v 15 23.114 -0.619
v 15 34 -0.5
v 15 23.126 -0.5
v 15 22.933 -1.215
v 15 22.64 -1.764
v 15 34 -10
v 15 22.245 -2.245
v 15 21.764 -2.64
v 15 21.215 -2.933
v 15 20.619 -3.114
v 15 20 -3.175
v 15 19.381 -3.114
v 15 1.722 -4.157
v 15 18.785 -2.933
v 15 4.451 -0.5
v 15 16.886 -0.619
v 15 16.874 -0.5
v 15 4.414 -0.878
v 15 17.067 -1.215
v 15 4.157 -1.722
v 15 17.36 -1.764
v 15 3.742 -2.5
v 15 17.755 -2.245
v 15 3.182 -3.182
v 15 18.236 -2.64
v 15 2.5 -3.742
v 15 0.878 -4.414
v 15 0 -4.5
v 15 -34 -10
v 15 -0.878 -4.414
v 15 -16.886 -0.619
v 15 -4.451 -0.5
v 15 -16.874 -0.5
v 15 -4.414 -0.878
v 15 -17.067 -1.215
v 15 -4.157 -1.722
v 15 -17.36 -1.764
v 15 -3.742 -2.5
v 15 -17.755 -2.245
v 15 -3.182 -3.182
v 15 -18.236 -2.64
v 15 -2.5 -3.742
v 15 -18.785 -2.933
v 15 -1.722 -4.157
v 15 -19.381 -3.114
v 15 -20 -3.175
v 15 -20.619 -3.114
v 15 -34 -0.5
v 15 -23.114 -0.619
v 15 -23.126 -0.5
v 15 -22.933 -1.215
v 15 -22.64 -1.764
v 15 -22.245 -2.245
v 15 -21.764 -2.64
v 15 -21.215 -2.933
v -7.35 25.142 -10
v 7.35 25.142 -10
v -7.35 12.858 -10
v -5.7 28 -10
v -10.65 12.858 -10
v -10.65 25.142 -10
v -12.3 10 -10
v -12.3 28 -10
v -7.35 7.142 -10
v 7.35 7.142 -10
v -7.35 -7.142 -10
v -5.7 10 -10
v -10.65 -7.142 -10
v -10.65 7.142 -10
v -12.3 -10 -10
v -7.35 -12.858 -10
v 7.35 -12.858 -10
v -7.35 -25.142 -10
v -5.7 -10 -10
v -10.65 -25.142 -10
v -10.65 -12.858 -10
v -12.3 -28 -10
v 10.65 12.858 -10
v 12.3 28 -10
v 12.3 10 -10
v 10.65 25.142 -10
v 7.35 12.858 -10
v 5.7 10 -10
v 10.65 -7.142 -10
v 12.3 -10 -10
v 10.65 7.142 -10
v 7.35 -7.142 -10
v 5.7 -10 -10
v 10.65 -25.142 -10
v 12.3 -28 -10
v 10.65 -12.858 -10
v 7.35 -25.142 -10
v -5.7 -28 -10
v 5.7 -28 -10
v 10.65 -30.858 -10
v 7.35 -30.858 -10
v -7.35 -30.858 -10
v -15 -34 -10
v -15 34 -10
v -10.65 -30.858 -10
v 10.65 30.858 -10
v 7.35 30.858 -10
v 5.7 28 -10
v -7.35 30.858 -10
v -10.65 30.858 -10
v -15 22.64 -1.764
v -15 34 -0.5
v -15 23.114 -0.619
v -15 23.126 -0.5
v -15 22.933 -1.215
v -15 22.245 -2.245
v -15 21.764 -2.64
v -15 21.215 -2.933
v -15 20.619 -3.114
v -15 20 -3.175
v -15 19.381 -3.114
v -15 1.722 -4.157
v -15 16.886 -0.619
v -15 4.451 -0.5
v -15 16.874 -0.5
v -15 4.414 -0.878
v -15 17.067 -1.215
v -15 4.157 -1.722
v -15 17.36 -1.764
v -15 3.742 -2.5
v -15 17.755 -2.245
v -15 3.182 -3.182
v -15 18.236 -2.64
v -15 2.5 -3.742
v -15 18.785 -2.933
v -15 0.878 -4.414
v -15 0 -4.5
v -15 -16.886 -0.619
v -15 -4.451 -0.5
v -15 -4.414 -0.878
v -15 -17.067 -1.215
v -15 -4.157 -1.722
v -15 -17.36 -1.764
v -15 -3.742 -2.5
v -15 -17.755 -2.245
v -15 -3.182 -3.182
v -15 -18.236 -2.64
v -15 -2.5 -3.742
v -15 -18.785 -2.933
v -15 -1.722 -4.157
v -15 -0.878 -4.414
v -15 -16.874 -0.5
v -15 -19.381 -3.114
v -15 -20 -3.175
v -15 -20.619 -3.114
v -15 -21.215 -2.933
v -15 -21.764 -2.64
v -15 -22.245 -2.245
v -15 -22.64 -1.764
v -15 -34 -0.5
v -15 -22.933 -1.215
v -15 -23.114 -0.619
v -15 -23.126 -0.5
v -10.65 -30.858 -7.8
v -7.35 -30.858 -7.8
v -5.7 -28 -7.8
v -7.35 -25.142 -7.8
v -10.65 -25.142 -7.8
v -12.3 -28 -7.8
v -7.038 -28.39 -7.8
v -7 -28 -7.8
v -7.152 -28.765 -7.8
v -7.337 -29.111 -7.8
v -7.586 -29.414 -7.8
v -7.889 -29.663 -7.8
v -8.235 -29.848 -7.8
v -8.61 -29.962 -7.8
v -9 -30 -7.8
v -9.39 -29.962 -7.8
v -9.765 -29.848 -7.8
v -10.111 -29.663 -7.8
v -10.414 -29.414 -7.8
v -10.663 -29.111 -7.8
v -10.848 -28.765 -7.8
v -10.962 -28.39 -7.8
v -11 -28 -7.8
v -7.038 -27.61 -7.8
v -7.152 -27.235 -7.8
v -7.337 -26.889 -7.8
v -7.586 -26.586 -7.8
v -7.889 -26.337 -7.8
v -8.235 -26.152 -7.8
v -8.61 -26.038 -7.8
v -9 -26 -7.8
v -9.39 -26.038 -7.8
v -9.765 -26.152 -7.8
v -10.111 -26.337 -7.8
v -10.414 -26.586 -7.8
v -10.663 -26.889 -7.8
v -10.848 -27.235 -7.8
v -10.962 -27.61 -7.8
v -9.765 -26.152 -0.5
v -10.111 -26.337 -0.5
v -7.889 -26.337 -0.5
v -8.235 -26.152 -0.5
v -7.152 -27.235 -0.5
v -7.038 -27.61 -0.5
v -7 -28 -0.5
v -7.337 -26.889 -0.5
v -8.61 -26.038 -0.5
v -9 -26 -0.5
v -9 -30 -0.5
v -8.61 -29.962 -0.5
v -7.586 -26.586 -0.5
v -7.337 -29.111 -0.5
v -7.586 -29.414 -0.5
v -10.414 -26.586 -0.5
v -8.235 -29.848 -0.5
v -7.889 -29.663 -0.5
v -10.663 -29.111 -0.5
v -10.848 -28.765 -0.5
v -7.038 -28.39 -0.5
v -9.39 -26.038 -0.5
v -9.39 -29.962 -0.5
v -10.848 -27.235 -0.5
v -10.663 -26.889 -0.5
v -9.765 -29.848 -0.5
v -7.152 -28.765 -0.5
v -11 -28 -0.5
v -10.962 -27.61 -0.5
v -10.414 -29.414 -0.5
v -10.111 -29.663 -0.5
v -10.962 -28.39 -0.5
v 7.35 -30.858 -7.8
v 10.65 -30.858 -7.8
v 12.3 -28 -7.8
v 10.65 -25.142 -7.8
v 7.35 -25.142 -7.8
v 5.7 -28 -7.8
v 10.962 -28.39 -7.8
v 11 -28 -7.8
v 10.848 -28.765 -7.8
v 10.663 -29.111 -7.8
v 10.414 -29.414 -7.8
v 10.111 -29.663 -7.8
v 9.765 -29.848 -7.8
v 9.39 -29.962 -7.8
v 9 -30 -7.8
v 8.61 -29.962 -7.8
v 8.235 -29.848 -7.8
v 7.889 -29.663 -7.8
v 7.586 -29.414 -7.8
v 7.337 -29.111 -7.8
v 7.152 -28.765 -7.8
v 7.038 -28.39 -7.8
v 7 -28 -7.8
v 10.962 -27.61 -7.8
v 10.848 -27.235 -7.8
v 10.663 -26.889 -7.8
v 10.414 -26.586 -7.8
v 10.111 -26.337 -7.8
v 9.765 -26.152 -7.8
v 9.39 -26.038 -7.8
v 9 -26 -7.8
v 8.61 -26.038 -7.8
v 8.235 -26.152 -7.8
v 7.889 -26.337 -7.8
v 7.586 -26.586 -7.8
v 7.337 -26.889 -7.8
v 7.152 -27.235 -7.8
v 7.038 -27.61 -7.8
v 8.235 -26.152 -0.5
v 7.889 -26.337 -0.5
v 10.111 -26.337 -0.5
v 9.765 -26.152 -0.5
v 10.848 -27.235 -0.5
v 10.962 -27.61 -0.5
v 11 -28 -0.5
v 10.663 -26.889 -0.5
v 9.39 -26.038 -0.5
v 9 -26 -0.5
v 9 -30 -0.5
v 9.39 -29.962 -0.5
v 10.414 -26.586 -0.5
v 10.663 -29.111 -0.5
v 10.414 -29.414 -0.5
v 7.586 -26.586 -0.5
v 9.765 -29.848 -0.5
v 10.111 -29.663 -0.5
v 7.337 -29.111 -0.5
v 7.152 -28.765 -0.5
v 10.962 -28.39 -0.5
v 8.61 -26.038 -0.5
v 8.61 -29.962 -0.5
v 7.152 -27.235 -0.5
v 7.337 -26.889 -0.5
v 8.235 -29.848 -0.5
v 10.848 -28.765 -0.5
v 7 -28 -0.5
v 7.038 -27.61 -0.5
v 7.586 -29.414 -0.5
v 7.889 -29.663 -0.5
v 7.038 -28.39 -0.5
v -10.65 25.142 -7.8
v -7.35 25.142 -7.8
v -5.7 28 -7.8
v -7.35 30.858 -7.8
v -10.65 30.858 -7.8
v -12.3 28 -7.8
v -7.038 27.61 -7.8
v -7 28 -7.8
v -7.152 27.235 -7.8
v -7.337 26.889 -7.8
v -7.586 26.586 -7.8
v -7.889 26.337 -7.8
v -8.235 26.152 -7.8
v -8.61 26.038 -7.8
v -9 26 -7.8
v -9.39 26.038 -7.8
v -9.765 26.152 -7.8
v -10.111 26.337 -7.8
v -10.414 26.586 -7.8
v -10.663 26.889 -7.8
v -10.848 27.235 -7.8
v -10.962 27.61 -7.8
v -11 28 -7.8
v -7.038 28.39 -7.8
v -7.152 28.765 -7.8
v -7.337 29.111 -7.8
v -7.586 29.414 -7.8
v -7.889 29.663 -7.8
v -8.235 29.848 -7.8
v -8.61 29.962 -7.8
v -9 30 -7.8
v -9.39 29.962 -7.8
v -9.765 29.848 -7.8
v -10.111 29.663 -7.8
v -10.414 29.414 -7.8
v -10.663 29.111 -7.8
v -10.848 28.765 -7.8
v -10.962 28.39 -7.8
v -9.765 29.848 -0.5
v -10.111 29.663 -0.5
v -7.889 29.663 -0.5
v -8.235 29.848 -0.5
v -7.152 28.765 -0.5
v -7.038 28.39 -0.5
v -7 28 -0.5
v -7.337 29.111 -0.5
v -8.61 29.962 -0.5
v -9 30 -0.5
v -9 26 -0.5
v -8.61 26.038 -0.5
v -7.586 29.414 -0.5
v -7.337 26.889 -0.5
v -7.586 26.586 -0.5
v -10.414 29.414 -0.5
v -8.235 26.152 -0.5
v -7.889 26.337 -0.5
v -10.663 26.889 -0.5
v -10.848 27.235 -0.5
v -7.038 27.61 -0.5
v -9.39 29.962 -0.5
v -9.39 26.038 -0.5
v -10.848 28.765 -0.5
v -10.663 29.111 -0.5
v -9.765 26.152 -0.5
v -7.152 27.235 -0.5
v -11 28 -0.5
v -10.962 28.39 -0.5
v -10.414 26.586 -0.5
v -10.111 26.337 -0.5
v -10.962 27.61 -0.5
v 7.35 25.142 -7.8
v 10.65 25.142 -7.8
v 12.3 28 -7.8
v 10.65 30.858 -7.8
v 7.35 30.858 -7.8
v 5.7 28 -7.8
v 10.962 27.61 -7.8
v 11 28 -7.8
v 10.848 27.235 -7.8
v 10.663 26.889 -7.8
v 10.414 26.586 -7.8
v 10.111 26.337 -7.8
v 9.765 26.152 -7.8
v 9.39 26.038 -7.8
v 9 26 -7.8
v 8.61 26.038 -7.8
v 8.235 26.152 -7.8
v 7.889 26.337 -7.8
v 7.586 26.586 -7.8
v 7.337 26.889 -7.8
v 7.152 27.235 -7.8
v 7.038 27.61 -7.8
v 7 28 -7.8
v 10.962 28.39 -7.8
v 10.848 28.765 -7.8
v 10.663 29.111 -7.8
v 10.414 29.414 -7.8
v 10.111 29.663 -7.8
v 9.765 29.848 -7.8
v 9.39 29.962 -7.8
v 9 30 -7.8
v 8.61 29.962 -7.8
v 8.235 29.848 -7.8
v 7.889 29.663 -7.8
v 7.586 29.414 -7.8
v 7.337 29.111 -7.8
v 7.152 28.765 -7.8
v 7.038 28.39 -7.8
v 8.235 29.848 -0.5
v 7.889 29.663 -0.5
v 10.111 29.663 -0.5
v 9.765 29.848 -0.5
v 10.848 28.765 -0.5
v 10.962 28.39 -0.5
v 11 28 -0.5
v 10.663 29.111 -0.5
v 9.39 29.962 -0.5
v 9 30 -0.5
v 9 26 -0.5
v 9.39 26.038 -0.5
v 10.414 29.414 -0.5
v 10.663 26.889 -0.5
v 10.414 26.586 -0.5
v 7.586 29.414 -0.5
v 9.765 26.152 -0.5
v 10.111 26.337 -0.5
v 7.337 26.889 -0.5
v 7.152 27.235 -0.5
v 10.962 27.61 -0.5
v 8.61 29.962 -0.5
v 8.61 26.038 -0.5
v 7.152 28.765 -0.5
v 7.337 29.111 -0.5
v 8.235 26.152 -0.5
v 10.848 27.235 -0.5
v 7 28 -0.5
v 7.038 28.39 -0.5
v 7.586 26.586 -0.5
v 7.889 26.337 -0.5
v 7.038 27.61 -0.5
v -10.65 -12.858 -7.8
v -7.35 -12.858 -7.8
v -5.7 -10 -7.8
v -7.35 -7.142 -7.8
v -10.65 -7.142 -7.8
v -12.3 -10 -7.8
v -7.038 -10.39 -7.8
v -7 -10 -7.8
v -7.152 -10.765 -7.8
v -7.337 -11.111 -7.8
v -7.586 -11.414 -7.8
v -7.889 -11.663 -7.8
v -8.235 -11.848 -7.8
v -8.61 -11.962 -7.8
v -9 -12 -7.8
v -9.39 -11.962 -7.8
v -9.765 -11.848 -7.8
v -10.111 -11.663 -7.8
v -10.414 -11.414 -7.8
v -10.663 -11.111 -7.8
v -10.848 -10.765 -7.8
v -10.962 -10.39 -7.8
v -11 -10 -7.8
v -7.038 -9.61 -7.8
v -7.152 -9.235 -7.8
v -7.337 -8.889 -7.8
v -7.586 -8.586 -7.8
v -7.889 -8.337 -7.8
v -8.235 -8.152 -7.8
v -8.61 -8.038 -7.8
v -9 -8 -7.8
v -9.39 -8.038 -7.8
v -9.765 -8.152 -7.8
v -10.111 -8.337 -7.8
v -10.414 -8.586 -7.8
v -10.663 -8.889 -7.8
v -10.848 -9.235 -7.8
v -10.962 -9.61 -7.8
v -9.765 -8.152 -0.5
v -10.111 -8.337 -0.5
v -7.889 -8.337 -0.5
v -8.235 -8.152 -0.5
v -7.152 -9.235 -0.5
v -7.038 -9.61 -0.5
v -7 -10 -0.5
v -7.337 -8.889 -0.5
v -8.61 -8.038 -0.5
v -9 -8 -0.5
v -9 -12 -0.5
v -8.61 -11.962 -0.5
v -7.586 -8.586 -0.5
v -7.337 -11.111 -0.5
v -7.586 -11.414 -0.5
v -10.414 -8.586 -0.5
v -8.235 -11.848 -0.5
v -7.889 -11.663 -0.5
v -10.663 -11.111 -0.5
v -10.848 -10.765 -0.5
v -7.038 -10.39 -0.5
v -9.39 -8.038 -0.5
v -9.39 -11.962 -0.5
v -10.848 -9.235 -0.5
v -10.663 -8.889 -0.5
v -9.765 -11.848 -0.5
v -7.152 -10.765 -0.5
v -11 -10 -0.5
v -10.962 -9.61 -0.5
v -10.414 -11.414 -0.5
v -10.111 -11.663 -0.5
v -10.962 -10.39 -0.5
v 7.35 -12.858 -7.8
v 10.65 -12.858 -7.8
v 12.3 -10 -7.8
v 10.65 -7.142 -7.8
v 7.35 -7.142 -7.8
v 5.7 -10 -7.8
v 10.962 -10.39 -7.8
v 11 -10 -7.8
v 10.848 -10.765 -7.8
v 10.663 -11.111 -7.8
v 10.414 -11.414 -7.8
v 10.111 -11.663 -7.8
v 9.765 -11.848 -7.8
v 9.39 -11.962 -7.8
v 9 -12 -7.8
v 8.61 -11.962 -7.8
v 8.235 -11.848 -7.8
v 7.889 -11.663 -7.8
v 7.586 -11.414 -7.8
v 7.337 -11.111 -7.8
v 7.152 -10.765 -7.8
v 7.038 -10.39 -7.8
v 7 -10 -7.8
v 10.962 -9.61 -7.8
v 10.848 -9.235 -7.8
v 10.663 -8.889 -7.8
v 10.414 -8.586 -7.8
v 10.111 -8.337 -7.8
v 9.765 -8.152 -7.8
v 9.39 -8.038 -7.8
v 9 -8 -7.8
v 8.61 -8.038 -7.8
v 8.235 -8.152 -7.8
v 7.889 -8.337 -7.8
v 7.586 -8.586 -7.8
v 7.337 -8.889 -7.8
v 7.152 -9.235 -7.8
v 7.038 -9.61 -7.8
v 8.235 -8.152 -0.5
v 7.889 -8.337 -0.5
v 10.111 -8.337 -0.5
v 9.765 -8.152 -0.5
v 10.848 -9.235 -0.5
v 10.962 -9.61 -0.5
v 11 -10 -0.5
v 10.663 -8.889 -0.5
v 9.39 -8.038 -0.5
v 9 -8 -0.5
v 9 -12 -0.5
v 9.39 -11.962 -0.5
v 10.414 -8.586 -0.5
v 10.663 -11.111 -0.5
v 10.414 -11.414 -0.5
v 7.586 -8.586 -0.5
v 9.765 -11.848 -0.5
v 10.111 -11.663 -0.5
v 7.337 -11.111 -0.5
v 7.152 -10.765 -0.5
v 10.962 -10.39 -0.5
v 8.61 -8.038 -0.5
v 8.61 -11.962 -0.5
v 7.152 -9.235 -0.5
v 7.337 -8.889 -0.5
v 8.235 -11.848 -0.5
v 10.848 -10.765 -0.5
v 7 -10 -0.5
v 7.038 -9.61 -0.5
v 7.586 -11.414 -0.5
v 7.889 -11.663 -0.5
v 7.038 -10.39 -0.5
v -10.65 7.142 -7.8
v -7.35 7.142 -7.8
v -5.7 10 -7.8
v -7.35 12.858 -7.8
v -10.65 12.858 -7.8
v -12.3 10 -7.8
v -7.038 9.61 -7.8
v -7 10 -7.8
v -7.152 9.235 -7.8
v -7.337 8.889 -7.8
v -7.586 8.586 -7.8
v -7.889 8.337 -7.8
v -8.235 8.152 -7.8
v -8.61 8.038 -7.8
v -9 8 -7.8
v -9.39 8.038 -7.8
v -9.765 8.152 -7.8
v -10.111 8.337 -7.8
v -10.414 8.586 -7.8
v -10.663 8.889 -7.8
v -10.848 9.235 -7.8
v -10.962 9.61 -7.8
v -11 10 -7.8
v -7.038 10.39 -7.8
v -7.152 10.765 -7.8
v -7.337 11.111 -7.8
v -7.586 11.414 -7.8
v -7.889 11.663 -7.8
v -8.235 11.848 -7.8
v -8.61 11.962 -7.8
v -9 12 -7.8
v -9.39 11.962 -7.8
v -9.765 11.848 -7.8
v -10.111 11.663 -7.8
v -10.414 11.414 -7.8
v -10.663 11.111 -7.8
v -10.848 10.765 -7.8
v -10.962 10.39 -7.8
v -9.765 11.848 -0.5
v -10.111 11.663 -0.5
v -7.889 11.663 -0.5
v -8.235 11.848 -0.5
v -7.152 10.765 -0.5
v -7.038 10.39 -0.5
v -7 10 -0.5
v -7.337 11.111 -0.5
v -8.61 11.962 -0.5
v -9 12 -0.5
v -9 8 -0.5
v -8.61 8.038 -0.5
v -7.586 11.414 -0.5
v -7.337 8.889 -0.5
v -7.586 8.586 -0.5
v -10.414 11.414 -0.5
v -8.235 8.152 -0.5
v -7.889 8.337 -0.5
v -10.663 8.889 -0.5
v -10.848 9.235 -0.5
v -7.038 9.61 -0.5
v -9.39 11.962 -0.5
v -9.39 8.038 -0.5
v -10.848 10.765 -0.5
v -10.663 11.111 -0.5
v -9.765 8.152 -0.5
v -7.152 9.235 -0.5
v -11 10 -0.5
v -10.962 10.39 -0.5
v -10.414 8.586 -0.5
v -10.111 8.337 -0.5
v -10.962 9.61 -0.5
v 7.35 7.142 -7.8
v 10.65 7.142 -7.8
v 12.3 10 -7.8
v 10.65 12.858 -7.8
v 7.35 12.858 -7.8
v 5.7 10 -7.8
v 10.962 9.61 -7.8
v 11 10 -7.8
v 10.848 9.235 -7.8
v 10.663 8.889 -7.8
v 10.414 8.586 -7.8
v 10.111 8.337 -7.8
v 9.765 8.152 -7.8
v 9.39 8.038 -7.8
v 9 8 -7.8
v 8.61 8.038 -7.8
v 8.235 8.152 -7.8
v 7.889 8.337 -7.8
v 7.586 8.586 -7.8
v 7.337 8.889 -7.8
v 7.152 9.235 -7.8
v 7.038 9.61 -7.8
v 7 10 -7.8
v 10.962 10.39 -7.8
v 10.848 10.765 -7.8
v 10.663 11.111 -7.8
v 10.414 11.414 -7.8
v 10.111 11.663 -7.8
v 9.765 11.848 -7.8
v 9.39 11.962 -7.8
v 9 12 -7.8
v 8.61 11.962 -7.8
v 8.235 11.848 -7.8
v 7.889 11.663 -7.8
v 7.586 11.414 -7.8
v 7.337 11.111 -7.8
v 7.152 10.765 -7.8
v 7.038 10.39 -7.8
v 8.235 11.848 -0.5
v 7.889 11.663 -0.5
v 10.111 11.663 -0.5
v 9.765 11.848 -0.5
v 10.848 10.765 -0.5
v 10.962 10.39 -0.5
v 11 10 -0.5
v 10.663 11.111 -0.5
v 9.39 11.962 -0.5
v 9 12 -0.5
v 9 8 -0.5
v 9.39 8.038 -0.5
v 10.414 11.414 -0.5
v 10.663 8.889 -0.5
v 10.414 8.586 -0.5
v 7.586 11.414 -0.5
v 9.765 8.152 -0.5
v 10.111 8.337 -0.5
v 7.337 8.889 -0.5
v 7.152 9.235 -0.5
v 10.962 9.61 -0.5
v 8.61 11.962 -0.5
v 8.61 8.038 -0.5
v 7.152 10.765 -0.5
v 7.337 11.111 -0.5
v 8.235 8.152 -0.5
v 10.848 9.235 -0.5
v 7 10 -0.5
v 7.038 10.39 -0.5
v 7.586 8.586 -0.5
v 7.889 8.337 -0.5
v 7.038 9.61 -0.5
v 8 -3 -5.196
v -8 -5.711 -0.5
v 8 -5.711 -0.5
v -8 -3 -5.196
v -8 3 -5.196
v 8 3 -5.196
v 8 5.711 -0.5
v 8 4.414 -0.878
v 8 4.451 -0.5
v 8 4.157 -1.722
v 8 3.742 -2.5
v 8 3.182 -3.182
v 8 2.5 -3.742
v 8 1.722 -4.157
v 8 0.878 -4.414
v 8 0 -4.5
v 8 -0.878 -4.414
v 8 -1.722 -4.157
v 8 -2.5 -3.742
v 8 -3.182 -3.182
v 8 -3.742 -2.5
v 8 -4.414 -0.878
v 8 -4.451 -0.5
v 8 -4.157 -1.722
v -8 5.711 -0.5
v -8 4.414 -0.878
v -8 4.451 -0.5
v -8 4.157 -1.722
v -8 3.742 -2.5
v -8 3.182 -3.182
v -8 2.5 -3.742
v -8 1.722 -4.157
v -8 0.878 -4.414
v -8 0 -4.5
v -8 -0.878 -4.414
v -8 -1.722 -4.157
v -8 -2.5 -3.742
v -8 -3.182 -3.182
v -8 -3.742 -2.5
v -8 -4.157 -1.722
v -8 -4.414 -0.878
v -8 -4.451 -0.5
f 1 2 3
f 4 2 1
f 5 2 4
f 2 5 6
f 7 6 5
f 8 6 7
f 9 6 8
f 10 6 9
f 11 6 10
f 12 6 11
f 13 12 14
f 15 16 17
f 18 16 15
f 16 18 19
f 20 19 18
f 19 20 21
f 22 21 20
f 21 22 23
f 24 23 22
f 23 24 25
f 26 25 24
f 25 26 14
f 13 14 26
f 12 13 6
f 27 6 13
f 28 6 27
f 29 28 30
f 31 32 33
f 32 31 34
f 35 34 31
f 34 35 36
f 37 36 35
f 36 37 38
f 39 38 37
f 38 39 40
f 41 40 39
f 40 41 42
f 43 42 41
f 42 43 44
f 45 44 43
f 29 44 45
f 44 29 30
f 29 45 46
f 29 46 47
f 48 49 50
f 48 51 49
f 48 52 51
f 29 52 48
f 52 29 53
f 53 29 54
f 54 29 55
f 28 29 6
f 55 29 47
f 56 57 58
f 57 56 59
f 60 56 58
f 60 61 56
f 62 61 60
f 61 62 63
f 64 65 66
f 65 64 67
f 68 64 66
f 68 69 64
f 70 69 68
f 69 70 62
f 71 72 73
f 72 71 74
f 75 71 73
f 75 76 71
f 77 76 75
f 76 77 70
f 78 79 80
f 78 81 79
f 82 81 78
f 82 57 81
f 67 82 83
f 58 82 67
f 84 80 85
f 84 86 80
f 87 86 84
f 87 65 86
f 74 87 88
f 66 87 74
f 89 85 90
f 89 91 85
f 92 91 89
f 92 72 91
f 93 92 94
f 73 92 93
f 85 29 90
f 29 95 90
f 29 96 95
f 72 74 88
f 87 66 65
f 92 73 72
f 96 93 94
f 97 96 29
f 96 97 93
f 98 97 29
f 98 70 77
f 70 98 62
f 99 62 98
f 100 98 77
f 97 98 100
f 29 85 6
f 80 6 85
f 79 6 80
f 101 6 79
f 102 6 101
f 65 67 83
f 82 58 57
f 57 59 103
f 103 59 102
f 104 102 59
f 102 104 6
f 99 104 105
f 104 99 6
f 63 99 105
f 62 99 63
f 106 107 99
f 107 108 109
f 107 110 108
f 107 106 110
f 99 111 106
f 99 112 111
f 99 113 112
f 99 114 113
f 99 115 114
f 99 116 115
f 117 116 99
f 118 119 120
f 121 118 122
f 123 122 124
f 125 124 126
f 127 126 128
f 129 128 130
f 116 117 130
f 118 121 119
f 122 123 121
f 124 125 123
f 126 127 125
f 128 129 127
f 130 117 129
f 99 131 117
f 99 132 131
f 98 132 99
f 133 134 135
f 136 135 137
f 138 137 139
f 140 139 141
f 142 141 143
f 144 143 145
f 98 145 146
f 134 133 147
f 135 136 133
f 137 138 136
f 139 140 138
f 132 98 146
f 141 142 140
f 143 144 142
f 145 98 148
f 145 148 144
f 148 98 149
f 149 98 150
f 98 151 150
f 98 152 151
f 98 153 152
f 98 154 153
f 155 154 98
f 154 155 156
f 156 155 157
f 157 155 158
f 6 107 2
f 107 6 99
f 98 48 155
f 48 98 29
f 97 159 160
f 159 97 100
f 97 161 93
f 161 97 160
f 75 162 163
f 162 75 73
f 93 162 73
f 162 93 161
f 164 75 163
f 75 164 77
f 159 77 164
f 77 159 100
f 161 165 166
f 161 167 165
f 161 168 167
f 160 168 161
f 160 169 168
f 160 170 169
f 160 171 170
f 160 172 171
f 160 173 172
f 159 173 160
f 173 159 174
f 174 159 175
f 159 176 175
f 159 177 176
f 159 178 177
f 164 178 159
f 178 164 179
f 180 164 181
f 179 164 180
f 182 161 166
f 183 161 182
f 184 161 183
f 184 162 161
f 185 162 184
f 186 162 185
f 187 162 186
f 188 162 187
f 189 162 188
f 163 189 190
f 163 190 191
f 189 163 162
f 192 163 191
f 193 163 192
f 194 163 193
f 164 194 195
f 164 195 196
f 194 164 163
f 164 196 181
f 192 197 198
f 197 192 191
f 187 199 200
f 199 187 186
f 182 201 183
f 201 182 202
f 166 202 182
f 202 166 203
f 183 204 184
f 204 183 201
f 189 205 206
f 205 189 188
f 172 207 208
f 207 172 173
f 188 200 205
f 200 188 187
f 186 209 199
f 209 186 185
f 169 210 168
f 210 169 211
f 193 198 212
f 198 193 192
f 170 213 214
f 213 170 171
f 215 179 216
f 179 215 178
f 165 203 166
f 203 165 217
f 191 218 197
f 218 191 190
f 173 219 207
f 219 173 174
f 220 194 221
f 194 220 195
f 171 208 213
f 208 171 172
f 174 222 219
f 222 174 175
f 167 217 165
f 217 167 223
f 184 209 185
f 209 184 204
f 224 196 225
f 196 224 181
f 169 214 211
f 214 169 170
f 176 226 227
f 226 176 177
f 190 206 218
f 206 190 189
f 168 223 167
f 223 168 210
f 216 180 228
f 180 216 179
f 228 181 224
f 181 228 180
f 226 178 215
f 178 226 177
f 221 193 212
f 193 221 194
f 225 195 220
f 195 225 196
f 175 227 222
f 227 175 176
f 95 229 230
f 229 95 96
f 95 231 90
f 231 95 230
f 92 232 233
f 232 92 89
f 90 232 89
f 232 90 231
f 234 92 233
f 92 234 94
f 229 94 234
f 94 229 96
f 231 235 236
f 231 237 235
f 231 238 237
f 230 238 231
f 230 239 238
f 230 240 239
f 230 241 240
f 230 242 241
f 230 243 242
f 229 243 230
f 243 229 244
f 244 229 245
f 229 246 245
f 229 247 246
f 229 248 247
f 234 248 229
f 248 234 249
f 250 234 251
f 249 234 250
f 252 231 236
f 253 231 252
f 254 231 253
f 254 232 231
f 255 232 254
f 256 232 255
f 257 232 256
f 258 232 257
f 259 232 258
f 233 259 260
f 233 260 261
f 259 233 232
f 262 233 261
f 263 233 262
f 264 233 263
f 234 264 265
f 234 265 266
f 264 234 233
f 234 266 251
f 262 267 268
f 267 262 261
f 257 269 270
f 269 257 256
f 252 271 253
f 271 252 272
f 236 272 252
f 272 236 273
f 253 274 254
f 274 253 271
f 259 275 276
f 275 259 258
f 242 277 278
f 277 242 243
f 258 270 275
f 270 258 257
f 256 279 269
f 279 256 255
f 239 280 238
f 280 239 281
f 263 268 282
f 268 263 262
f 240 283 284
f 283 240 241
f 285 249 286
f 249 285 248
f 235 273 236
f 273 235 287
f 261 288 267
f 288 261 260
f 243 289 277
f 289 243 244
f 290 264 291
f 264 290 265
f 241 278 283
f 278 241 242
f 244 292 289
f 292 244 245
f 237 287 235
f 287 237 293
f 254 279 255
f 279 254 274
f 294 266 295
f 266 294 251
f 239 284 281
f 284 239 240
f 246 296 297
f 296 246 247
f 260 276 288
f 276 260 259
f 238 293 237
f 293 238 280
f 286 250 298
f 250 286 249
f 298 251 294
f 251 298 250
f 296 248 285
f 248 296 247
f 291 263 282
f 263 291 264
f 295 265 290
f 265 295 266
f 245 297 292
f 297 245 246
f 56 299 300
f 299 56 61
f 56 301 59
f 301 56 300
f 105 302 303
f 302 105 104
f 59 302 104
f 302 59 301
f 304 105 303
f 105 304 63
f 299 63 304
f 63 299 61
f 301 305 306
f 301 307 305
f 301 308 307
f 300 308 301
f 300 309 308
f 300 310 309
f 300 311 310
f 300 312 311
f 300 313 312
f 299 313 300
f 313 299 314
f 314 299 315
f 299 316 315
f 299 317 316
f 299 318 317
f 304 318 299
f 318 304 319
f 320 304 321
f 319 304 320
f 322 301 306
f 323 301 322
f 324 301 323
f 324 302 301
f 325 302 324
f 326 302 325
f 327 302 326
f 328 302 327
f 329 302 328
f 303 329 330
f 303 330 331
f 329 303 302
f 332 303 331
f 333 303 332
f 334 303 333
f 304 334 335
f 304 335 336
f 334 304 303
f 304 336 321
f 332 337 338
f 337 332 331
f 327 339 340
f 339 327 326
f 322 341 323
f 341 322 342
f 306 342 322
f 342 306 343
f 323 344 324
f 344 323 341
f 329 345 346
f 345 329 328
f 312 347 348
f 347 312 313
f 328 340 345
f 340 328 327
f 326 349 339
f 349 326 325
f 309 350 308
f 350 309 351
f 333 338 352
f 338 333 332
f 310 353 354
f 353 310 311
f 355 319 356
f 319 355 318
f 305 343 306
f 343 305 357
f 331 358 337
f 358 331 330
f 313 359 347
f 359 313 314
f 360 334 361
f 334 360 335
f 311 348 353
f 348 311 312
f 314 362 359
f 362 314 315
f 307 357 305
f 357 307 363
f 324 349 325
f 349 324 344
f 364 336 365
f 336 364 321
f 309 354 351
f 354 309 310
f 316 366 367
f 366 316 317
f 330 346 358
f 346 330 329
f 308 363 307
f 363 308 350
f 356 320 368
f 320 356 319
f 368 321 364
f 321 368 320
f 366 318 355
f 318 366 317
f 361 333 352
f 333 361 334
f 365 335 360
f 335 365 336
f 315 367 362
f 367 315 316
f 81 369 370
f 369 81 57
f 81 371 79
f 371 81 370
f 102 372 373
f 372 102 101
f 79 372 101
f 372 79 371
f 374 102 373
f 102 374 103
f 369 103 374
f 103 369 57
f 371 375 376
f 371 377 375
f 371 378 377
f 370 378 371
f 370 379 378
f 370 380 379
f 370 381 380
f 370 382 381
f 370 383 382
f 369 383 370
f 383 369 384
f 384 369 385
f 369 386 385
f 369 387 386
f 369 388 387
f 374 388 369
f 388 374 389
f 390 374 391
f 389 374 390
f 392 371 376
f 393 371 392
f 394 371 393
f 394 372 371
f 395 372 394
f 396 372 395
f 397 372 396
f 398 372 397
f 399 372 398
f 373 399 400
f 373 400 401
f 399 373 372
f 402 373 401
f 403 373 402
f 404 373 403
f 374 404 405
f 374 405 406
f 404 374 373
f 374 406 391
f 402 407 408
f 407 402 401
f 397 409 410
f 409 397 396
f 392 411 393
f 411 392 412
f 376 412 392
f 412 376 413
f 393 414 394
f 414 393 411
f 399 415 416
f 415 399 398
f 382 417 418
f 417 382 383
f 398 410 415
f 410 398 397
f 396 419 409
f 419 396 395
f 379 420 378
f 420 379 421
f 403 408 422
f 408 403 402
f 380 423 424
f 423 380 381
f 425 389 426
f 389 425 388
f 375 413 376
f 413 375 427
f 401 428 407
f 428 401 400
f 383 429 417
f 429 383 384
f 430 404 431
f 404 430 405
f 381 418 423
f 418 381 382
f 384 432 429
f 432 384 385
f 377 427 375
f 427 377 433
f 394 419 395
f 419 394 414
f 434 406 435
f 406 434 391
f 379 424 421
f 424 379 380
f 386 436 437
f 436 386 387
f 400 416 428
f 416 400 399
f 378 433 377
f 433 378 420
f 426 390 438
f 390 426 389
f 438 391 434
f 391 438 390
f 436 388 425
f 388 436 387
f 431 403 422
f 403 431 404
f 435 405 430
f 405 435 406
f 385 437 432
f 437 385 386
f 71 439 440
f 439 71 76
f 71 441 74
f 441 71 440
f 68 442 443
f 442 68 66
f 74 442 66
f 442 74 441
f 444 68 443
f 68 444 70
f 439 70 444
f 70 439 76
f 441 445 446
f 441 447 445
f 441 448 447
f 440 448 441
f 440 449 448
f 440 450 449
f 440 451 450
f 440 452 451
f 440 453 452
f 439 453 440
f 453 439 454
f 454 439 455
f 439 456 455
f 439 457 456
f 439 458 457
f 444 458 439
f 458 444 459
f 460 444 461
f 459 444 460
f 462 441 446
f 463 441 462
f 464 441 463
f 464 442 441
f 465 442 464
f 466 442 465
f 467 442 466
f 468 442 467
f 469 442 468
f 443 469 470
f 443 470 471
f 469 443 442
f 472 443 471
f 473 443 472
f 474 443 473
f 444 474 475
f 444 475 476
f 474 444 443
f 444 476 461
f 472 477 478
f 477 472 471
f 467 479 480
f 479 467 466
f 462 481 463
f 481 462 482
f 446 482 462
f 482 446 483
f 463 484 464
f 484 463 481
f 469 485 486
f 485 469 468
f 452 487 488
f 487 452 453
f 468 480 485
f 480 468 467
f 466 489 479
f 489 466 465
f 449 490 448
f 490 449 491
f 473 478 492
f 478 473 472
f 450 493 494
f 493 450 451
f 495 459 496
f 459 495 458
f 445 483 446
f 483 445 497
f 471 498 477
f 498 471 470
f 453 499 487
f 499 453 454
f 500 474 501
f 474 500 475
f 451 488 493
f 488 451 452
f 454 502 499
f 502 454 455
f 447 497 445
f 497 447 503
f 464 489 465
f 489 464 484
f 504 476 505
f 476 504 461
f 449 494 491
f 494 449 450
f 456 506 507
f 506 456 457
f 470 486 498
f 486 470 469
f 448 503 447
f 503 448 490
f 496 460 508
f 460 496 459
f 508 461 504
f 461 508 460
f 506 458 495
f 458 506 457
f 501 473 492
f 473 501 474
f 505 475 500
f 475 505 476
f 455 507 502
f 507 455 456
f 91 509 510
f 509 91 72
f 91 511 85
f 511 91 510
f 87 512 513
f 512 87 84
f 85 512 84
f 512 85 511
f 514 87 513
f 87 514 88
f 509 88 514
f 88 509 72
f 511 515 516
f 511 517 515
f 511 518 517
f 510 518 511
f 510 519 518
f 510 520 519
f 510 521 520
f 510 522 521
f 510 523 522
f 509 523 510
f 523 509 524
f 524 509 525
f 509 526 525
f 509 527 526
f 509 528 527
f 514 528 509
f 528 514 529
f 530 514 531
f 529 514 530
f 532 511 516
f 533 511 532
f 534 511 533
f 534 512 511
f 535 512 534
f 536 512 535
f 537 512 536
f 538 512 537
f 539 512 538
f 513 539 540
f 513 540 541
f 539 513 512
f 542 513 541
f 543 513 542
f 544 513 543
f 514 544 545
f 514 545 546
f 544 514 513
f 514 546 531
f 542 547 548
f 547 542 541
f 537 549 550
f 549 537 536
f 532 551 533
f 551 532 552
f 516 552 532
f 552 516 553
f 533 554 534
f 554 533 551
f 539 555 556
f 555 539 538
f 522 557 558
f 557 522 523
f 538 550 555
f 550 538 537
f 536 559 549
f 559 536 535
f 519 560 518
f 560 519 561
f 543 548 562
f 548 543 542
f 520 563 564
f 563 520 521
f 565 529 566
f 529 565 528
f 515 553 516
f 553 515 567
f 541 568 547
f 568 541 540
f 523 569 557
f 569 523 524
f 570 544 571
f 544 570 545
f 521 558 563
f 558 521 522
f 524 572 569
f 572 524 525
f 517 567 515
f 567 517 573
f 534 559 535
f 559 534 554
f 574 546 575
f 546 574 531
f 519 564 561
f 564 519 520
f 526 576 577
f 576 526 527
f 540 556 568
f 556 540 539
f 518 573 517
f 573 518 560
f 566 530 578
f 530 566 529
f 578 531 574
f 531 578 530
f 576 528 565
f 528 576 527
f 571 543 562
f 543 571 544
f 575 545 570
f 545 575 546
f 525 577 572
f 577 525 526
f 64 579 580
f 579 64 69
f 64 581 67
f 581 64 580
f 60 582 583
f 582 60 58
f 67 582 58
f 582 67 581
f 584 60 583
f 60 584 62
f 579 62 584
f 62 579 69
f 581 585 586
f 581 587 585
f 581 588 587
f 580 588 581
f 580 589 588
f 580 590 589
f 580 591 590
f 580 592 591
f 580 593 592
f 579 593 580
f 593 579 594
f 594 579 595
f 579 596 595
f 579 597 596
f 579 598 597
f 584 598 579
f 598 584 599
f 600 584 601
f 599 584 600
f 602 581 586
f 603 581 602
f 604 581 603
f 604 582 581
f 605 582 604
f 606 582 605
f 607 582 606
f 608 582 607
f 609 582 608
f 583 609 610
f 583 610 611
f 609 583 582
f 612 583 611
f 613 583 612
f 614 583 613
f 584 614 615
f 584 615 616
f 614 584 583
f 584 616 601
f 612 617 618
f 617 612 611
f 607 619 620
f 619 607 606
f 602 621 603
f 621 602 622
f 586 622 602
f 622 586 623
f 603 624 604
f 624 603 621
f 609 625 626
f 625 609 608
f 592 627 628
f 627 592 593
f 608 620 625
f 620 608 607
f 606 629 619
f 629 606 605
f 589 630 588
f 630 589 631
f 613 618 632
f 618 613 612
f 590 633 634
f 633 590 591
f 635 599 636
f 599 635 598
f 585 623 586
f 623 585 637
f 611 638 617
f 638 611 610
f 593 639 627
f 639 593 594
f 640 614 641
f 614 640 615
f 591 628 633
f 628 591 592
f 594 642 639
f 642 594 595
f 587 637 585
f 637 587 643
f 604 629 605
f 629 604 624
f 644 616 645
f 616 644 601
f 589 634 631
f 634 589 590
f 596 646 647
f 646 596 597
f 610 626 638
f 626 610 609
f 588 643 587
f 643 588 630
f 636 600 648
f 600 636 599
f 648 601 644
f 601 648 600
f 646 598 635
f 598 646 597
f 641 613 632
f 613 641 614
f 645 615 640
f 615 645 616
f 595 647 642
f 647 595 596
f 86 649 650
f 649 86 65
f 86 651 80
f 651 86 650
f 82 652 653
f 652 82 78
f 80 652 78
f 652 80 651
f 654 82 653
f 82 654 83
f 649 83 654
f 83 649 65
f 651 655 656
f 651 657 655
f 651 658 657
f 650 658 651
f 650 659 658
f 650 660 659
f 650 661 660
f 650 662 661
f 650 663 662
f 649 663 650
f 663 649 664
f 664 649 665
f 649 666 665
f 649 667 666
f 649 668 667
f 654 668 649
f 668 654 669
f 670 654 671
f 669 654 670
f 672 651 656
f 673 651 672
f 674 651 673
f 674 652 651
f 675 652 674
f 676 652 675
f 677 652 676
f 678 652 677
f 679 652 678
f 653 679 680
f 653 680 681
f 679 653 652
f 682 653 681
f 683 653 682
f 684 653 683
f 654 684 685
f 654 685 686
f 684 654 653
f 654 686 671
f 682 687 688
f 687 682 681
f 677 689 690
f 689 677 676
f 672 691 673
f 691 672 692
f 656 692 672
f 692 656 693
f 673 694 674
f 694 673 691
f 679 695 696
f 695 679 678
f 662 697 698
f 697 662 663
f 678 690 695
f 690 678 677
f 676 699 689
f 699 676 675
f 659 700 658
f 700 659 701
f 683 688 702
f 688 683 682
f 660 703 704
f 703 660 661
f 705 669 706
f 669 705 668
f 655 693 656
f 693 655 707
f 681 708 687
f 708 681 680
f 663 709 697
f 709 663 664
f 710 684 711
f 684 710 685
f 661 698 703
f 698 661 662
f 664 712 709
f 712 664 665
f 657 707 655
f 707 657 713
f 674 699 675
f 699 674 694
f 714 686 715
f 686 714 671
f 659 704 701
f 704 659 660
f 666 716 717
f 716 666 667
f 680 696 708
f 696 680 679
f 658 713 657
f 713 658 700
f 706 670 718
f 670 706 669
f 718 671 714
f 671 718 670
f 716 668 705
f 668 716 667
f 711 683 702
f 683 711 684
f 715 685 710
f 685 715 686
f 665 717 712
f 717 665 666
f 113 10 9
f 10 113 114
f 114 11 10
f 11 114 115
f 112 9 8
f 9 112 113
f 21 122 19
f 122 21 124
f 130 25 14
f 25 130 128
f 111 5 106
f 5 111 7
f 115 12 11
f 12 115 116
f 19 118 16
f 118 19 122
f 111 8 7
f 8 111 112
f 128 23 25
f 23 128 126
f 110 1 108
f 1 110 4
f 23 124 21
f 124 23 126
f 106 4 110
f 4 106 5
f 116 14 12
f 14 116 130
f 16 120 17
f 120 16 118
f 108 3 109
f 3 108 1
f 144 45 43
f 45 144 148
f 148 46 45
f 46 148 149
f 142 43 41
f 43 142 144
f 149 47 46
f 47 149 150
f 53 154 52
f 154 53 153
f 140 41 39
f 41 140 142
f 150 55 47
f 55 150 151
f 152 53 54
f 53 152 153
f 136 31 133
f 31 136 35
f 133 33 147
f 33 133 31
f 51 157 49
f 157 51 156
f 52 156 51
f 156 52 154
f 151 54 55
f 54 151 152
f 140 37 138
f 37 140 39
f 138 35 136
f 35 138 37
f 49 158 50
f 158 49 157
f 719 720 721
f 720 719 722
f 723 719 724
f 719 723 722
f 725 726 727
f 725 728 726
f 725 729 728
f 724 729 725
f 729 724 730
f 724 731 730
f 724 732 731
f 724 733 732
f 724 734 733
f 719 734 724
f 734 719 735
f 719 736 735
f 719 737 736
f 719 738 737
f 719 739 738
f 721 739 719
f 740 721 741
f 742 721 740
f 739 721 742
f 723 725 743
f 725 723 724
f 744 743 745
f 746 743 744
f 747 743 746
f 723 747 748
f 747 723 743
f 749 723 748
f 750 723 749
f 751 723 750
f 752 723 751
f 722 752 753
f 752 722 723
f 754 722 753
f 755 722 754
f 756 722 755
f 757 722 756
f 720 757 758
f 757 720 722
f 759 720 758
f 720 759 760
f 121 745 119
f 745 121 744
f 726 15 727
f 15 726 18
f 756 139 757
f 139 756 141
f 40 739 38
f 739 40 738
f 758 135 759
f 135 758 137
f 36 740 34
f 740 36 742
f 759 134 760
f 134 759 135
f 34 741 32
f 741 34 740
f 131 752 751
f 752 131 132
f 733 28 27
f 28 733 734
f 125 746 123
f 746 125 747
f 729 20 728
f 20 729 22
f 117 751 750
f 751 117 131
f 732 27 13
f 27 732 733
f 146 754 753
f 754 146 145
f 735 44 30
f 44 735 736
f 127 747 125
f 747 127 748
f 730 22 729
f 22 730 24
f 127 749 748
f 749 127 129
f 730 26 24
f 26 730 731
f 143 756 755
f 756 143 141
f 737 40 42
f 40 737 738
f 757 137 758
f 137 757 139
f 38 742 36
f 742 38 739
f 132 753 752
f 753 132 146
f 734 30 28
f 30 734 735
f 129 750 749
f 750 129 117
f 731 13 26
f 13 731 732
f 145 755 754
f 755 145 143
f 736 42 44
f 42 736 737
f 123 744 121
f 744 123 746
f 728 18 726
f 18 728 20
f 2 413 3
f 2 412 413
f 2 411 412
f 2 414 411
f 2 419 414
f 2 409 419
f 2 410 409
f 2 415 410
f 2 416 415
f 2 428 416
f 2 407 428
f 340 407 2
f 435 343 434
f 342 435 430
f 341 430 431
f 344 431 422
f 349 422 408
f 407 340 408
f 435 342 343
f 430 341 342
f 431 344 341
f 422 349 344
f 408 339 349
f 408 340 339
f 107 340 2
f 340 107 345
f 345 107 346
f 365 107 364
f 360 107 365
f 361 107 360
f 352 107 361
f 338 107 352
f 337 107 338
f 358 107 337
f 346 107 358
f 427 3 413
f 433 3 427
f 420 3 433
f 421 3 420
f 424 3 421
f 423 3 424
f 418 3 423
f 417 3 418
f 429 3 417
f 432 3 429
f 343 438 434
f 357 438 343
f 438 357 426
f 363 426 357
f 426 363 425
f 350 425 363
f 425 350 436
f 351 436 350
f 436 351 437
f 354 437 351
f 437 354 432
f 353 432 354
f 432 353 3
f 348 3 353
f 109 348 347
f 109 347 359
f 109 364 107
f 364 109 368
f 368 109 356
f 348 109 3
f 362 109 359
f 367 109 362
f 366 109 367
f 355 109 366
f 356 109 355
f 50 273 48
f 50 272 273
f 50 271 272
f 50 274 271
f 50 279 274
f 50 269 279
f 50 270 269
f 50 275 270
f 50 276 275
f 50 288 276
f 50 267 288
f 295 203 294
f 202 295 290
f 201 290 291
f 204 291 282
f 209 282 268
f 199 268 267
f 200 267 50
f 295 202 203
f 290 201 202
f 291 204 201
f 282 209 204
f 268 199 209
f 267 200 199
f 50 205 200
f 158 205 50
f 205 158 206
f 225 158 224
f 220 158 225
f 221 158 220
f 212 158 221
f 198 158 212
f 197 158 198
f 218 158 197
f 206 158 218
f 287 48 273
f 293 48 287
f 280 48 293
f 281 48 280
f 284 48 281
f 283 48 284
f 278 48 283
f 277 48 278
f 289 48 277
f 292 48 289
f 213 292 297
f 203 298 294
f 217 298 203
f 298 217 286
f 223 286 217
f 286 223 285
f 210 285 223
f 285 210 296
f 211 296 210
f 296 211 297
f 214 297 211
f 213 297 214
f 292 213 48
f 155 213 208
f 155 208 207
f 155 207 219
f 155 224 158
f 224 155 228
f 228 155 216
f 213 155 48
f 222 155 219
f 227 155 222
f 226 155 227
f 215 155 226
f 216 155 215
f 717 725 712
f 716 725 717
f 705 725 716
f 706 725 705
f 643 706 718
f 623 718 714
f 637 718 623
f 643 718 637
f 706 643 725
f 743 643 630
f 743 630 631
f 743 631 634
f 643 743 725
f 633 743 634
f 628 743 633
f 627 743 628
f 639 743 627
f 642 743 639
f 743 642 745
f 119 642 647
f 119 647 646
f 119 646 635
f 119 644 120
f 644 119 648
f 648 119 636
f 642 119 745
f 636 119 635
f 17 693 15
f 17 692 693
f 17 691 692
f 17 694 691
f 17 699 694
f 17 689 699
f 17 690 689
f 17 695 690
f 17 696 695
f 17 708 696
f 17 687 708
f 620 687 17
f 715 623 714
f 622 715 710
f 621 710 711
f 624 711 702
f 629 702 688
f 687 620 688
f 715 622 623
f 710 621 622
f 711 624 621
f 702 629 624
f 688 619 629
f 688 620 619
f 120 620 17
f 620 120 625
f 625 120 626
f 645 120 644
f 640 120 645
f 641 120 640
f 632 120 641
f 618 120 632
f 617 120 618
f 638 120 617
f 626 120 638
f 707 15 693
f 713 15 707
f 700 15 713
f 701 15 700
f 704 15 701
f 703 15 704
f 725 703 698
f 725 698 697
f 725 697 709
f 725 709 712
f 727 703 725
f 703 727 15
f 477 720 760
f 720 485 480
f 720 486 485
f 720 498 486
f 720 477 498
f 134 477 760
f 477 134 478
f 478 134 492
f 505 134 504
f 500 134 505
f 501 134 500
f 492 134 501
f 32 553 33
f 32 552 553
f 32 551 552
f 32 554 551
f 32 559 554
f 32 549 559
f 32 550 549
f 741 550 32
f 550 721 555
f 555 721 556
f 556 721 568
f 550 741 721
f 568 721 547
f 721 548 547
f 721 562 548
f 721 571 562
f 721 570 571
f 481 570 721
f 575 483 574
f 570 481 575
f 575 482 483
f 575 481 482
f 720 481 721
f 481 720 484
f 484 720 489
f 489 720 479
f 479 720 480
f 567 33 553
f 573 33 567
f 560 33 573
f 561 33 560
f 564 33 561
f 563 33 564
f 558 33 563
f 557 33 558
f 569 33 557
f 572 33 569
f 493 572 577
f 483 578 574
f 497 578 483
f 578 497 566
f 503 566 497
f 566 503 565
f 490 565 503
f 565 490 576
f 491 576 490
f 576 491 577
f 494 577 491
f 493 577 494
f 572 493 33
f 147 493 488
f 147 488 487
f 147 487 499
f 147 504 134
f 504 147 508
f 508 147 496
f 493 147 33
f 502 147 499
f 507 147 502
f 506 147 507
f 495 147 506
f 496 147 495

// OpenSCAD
// file: screwnut.scad
module screwnut(height)
{
	cylinder(h=height,r=11/2 + 0.5,$fn=6, center=true);
}
// file: centermountscrew.scad
module centermountscrew(height)
{
	union()
	{
		translate([0,0,-height/2+2.3/2-0.1]) cylinder(r=3.3,h=2.3,center=true,$fn=6);
		cylinder(r=4/2,h=height,center=true,$fn=32);
		translate([0,0,height/2-2.3/2+0.1]) cylinder(r=3.3,h=2.3,center=true,$fn=32);

	}
}
// file: centermount.scad
include <centermountscrew.scad>
include <screwnut.scad>
module centermount()
{
	difference() 
	{
		union()
		{
			translate([0,0,0]) cube([30,68,20], center=true);
			translate([0,0,14]) cube([30,30,8], center=true);
		}
		rotate([0,90,0]) rotate([0,0,30]) screwnut(16);
		rotate([0,90,0]) cylinder(r=9/2,h=32, center=true,$fn=32);
		rotate([0,0,30]) translate([0,0,16.1]) screwnut(4);
		rotate([0,0,30]) translate([0,0,6]) cylinder(r=15/2,h=13,center=true,$fn=32);
		translate([0,0,14]) cylinder(r=6/2,h=10,center=true, $fn=32);
		translate([0,0,0]) cube([32,70,1], center=true);

		translate([-9,-28,0]) centermountscrew(20);
		translate([9,-28,0]) centermountscrew(20);
		translate([-9,28,0]) centermountscrew(20);
		translate([9,28,0]) centermountscrew(20);

		translate([-9,-10,4]) centermountscrew(28);
		translate([9,-10,4]) centermountscrew(28);
		translate([-9,10,4]) centermountscrew(28);
		translate([9,10,4]) centermountscrew(28);
		rotate([0,90,0]) 
		{
			translate([ 0 ,20,0]) cylinder(h=32,r=6.35/2,center=true, $fn=32);
			translate([ 0 ,0,0]) cylinder(h=32,r=6.35/2,center=true, $fn=32);
			translate([ 0 ,-20,0]) cylinder(h=32,r=6.35/2,center=true, $fn=32);
		}
	}
}
// main file
include <centermount.scad>

module centermountbottom()
{
	difference()
	{
		centermount();
		translate([0,0,15]) cube([32,70,30], center=true);
	}
}

centermountbottom();
